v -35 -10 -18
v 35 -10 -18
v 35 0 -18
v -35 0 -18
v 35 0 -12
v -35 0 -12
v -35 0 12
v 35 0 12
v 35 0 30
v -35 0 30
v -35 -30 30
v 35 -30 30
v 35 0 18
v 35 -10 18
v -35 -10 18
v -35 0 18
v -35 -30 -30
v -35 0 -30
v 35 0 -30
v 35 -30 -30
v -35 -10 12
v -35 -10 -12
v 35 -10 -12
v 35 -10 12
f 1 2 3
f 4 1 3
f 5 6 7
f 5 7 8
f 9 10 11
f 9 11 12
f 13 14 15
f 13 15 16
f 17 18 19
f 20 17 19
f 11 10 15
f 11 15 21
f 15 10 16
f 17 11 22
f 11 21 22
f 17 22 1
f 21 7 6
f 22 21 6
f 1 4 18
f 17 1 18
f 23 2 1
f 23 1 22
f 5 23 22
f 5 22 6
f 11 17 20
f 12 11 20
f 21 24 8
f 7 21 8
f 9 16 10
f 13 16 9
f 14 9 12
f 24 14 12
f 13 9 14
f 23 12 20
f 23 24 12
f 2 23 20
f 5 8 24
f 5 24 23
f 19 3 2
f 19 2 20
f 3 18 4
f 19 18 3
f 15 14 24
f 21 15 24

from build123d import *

# Parameters (mm, degrees)
SKETCH3_W           = 70
SKETCH3_H           = 60
BOSS_EXTRUDE1_DEPTH = 30
SKETCH4_W           = 6
SKETCH4_H           = 20
CUT_EXTRUDE1_DEPTH  = 82.853527719


with BuildPart() as part:
    # Sketch3 → Boss-Extrude1 (new body)
    with BuildSketch(Plane(origin=(0, 0, 0), x_dir=(1, 0, 0), z_dir=(0, 1, 0))):
        Rectangle(SKETCH3_W, SKETCH3_H)
    extrude(amount=-BOSS_EXTRUDE1_DEPTH)

    # Sketch4 → Cut-Extrude1 (cut, through all)
    with BuildSketch(Plane(origin=(35, 0, 0), x_dir=(0, 0, -1), z_dir=(1, 0, 0))):
        with Locations((-15, 0)):
            Rectangle(SKETCH4_W, SKETCH4_H)
    cut_extrude1 = extrude(amount=-CUT_EXTRUDE1_DEPTH, mode=Mode.SUBTRACT)

    # Mirror1: Cut-Extrude1 across plane
    add(cut_extrude1.mirror(Plane.XY), mode=Mode.SUBTRACT)


solid = part.part
